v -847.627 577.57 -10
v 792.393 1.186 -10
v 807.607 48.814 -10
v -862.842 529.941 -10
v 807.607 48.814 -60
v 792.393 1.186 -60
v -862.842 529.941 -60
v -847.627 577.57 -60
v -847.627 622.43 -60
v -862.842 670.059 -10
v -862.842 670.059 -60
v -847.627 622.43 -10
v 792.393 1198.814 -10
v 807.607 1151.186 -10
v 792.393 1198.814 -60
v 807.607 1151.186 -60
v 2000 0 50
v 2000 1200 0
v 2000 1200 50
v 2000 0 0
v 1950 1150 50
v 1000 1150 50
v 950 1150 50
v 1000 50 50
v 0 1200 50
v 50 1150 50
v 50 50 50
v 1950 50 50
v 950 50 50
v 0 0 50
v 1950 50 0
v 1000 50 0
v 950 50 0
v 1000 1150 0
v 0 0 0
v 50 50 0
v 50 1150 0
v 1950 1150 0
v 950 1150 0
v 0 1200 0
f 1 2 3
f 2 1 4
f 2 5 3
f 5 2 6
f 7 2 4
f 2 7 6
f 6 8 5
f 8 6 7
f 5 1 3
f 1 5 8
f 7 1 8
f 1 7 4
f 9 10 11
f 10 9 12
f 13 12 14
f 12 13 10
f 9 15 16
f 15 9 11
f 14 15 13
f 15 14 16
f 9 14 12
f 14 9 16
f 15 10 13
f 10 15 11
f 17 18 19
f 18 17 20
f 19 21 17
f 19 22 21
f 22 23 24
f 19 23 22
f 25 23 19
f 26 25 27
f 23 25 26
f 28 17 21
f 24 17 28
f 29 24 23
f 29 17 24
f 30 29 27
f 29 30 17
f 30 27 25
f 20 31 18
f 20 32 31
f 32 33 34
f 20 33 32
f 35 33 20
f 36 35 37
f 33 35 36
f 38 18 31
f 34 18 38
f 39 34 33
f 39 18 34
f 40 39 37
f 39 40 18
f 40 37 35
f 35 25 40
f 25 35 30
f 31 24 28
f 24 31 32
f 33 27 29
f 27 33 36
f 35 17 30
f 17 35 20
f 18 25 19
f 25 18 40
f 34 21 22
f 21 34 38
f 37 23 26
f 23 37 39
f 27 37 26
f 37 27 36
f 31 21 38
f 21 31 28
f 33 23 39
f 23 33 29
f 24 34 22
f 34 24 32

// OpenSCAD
// cad/frame.scad
/*
 * Offroad Adventure Trailer - Chassis / Steel Frame
 *
 * Parametric model of the base frame in 50x50 mm square steel (VKR)
 * with a V-drawbar (A-frame) in the same profile — DEFAULT design.
 * The legacy single central bar (VKR 100x50x4 standing) remains fully
 * modeled behind v_drawbar=false.
 *
 * V-DRAWBAR SIZING (check_v_drawbar in scripts/beam_check.py):
 *   Vertical 3g tongue splits over two arms -> 166 MPa/arm, SF 2.1;
 *   lateral loads resolve AXIALLY through the triangle (6 MPa vs
 *   135 MPa weak-axis bending in the single bar); governing combined
 *   case SF 3.0 vs 1.8 for the single bar. Joints: preload friction
 *   carries everything (check_v_joints) — crossbeam lap is a sleeve-
 *   CLAMP with the bolts beside the arm (peak arm moment, no holes in
 *   the arm), rail ends single-bolted, apex plates through-bolted.
 *
 * SINGLE-BAR SIZING (legacy alternative):
 *   100 kg tongue load x 3g dynamic off-road factor x 1.09 m lever
 *   = 3.2 kNm bending moment at the front crossbeam.
 *   VKR 100x50x4 standing: W = 28.8 cm3 -> ~111 MPa vs S355 yield
 *   = safety factor ~3.2 (good fatigue margin).
 *   (A 50x50x3 gave ~390 MPa - above yield - hence the bigger beam.)
 *   Lateral loads: the beam laps under the frame back to the MID
 *   CROSSBEAM (x 950-1000), so the side moment is taken as a force
 *   couple over ~0.95 m instead of at a single joint. NOTE: the beam
 *   must end BEFORE the torsion-axle tube (x ~1070-1150), which crosses
 *   the centerline at the same depth. There is no separate crossbeam
 *   over the axle - the bolted axle tube itself ties the rails there.
 *   Front: angle-bracket clamp (drawbar_angle_joint.scad, no holes in
 *   the flanges). Rear: M12 through-bolt + spacer at the mid crossbeam.
 *
 * Every through-bolt in the frame requires an internal crush sleeve
 * (precision tube, e.g. 16x2.5 mm for M10, 20x3 for M12) so full
 * preload torque can be used without deforming the RHS walls.
 */

tube_w = 50;
frame_length = 2000;
frame_width = 1200;      // Narrowed from 1400: with 265/60R18 on the
                         // Ranger's track (1560 mm), body-to-tire
                         // clearance = (1560-265)/2 - 600 = 47.5 mm.
                         // A 1400 mm frame is geometrically impossible
                         // with a matched track.
plate_t = 10;            // Aluminum plate thickness (corner/wedge/spacer)

// --- Central drawbar (VKR 100x50x4, standing) ---
drawbar_reach = 1000;    // Coupling point distance ahead of the frame
bar_w = 50;              // Beam width (Y)
bar_h = 100;             // Beam height (Z) - standing orientation for max W
// The beam laps under the frame to the mid crossmember (950-1000) and
// ends 50 mm before the torsion-axle tube (front edge x=1070):
drawbar_end_x = 1020;
drawbar_len = drawbar_reach + drawbar_end_x;   // 2020 mm total

// --- V-drawbar (A-frame) — DEFAULT design ---
// Two straight square-cut VKR 50x50x3 arms (same profile as the frame)
// from the coupling apex, attached under the front crossbeam (sleeve-
// clamp, bolts beside the arm — peak arm moment, no holes in the arm)
// and the side-rail ends (one through-bolt each). No welds, no miter
// cuts: the apex is tied by a CNC plate top+bottom sandwich
// (v_apex_plate.scad) and the angled laps get wedge spacer plates
// (drawbar_wedge_plate.scad).
// Arm rear ends under the rails. 800 (not further forward!) keeps the
// V narrow enough that the front-crossbeam clamp bolts clear the
// 200x200 corner plates (crossing at ~327 mm off-center -> nearest
// bolt ~282, plate ends at 200), and stays short of the mid-crossbeam
// T-plates on the rails (x 910..1040).
v_attach_x = 800;
v_arm_dx = v_attach_x + drawbar_reach;     // 1800 mm plan run
v_arm_dy = frame_width/2 - tube_w/2;       // 575 mm half spread
v_arm_len = sqrt(v_arm_dx*v_arm_dx + v_arm_dy*v_arm_dy);   // ~1890 mm
v_theta = atan(v_arm_dy / v_arm_dx);       // ~17.7 deg arm half-angle
// Square-cut tips stop short of each other: v_tip_gap of clear air
// between the two tube corners at the apex, so cut-length tolerance
// never makes the tubes press against each other — the apex plates
// bridge the gap. (Manufacturing/assembly slack, deliberate.)
v_tip_gap = 40;
v_tip_trim = (v_tip_gap/2 + (tube_w/2)/cos(v_theta)) / sin(v_theta);  // ~152 mm

// floor_crossbars: the two OPTIONAL floor crossbars (x 475-525 and
// 1475-1525), OFF by default. FEA-verified frame-neutral — they serve
// the formply floor span, lashing points and the water-tank hanger, so
// the frame is fully valid without them. Enable per-assembly:
//   trailer_frame(floor_crossbars = true)
// v_drawbar: true (DEFAULT design) = the V-drawbar described above;
// false = the legacy single central bar. The assembly passes the value
// from cad/design_params.scad.
module trailer_frame(floor_crossbars = false, v_drawbar = true) {
    color("silver") {
        // Side rails (left and right)
        translate([0, 0, 0]) cube([frame_length, tube_w, tube_w]);
        translate([0, frame_width - tube_w, 0]) cube([frame_length, tube_w, tube_w]);

        // Short sides (front and rear)
        // Recessed between the rails to give clean bolt faces at the corners
        translate([tube_w, tube_w, 0])
            rotate([0, 0, 90]) cube([frame_width - 2*tube_w, tube_w, tube_w]);
        translate([frame_length, tube_w, 0])
            rotate([0, 0, 90]) cube([frame_width - 2*tube_w, tube_w, tube_w]);

        // Mid crossbeam (x 950-1000): takes the drawbar's rear lap bolt
        // AND ties the rails ahead of the axle. No separate beam over
        // the axle: the bolted torsion-axle tube (x 1070-1150) is
        // itself a cross-tie via its rail brackets.
        translate([1000, tube_w, 0])
            rotate([0, 0, 90]) cube([frame_width - 2*tube_w, tube_w, tube_w]);

        // OPTIONAL floor crossbars at ~500 mm spacing (beams at
        // 0/500/975/1500/2000): these carry the 15 mm formply floor
        // (unsupported spans drop from ~950 to ~475 mm under cargo point
        // loads), give lashing/body mounting points, and the rear one
        // doubles as the water-tank hanger (tank zone x 1125-1675).
        // They clear the axle tube. Each end bolts to the rail through
        // a top+bottom T-plate sandwich like the mid crossbeam
        // (see main_assembly.scad).
        if (floor_crossbars) {
            translate([525, tube_w, 0])
                rotate([0, 0, 90]) cube([frame_width - 2*tube_w, tube_w, tube_w]);
            translate([1525, tube_w, 0])
                rotate([0, 0, 90]) cube([frame_width - 2*tube_w, tube_w, tube_w]);
        }

        if (v_drawbar) {
            // V-drawbar arms: straight square-cut VKR 50x50x3 hanging
            // plate_t below the frame plane (wedge plates fill the gap
            // at the front crossbeam and the rail-end laps). The tips
            // stop ~70 mm short of the centerline convergence — the
            // apex V-plate sandwich (main_assembly.scad) ties them.
            for (s = [-1, 1])
                translate([v_attach_x, frame_width/2 + s*v_arm_dy, -(tube_w + plate_t)])
                    rotate([0, 0, atan2(-s*v_arm_dy, -v_arm_dx)])
                        translate([0, -tube_w/2, 0])
                            cube([v_arm_len - v_tip_trim, tube_w, tube_w]);

            // NOTE: no coupling head modeled — how the coupling mounts
            // to the apex is an open design point.
        } else {
            // Central drawbar (VKR 100x50x4, standing): sits plate_t below
            // the frame plane. 10 mm milled spacer plates fill the gap at
            // the front crossbeam (angle clamp) and the mid crossmember
            // (M12 through-bolt + crush sleeves).
            translate([-drawbar_reach, frame_width/2 - bar_w/2, -(bar_h + plate_t)])
                cube([drawbar_len, bar_w, bar_h]);

            // Coupling mock (visual placeholder, level with the beam top)
            translate([-drawbar_reach - 120, frame_width/2 - tube_w/2, -(plate_t + tube_w)])
                cube([120, tube_w, tube_w]);
        }
    }
}

// Renders if the file is opened standalone
trailer_frame();
